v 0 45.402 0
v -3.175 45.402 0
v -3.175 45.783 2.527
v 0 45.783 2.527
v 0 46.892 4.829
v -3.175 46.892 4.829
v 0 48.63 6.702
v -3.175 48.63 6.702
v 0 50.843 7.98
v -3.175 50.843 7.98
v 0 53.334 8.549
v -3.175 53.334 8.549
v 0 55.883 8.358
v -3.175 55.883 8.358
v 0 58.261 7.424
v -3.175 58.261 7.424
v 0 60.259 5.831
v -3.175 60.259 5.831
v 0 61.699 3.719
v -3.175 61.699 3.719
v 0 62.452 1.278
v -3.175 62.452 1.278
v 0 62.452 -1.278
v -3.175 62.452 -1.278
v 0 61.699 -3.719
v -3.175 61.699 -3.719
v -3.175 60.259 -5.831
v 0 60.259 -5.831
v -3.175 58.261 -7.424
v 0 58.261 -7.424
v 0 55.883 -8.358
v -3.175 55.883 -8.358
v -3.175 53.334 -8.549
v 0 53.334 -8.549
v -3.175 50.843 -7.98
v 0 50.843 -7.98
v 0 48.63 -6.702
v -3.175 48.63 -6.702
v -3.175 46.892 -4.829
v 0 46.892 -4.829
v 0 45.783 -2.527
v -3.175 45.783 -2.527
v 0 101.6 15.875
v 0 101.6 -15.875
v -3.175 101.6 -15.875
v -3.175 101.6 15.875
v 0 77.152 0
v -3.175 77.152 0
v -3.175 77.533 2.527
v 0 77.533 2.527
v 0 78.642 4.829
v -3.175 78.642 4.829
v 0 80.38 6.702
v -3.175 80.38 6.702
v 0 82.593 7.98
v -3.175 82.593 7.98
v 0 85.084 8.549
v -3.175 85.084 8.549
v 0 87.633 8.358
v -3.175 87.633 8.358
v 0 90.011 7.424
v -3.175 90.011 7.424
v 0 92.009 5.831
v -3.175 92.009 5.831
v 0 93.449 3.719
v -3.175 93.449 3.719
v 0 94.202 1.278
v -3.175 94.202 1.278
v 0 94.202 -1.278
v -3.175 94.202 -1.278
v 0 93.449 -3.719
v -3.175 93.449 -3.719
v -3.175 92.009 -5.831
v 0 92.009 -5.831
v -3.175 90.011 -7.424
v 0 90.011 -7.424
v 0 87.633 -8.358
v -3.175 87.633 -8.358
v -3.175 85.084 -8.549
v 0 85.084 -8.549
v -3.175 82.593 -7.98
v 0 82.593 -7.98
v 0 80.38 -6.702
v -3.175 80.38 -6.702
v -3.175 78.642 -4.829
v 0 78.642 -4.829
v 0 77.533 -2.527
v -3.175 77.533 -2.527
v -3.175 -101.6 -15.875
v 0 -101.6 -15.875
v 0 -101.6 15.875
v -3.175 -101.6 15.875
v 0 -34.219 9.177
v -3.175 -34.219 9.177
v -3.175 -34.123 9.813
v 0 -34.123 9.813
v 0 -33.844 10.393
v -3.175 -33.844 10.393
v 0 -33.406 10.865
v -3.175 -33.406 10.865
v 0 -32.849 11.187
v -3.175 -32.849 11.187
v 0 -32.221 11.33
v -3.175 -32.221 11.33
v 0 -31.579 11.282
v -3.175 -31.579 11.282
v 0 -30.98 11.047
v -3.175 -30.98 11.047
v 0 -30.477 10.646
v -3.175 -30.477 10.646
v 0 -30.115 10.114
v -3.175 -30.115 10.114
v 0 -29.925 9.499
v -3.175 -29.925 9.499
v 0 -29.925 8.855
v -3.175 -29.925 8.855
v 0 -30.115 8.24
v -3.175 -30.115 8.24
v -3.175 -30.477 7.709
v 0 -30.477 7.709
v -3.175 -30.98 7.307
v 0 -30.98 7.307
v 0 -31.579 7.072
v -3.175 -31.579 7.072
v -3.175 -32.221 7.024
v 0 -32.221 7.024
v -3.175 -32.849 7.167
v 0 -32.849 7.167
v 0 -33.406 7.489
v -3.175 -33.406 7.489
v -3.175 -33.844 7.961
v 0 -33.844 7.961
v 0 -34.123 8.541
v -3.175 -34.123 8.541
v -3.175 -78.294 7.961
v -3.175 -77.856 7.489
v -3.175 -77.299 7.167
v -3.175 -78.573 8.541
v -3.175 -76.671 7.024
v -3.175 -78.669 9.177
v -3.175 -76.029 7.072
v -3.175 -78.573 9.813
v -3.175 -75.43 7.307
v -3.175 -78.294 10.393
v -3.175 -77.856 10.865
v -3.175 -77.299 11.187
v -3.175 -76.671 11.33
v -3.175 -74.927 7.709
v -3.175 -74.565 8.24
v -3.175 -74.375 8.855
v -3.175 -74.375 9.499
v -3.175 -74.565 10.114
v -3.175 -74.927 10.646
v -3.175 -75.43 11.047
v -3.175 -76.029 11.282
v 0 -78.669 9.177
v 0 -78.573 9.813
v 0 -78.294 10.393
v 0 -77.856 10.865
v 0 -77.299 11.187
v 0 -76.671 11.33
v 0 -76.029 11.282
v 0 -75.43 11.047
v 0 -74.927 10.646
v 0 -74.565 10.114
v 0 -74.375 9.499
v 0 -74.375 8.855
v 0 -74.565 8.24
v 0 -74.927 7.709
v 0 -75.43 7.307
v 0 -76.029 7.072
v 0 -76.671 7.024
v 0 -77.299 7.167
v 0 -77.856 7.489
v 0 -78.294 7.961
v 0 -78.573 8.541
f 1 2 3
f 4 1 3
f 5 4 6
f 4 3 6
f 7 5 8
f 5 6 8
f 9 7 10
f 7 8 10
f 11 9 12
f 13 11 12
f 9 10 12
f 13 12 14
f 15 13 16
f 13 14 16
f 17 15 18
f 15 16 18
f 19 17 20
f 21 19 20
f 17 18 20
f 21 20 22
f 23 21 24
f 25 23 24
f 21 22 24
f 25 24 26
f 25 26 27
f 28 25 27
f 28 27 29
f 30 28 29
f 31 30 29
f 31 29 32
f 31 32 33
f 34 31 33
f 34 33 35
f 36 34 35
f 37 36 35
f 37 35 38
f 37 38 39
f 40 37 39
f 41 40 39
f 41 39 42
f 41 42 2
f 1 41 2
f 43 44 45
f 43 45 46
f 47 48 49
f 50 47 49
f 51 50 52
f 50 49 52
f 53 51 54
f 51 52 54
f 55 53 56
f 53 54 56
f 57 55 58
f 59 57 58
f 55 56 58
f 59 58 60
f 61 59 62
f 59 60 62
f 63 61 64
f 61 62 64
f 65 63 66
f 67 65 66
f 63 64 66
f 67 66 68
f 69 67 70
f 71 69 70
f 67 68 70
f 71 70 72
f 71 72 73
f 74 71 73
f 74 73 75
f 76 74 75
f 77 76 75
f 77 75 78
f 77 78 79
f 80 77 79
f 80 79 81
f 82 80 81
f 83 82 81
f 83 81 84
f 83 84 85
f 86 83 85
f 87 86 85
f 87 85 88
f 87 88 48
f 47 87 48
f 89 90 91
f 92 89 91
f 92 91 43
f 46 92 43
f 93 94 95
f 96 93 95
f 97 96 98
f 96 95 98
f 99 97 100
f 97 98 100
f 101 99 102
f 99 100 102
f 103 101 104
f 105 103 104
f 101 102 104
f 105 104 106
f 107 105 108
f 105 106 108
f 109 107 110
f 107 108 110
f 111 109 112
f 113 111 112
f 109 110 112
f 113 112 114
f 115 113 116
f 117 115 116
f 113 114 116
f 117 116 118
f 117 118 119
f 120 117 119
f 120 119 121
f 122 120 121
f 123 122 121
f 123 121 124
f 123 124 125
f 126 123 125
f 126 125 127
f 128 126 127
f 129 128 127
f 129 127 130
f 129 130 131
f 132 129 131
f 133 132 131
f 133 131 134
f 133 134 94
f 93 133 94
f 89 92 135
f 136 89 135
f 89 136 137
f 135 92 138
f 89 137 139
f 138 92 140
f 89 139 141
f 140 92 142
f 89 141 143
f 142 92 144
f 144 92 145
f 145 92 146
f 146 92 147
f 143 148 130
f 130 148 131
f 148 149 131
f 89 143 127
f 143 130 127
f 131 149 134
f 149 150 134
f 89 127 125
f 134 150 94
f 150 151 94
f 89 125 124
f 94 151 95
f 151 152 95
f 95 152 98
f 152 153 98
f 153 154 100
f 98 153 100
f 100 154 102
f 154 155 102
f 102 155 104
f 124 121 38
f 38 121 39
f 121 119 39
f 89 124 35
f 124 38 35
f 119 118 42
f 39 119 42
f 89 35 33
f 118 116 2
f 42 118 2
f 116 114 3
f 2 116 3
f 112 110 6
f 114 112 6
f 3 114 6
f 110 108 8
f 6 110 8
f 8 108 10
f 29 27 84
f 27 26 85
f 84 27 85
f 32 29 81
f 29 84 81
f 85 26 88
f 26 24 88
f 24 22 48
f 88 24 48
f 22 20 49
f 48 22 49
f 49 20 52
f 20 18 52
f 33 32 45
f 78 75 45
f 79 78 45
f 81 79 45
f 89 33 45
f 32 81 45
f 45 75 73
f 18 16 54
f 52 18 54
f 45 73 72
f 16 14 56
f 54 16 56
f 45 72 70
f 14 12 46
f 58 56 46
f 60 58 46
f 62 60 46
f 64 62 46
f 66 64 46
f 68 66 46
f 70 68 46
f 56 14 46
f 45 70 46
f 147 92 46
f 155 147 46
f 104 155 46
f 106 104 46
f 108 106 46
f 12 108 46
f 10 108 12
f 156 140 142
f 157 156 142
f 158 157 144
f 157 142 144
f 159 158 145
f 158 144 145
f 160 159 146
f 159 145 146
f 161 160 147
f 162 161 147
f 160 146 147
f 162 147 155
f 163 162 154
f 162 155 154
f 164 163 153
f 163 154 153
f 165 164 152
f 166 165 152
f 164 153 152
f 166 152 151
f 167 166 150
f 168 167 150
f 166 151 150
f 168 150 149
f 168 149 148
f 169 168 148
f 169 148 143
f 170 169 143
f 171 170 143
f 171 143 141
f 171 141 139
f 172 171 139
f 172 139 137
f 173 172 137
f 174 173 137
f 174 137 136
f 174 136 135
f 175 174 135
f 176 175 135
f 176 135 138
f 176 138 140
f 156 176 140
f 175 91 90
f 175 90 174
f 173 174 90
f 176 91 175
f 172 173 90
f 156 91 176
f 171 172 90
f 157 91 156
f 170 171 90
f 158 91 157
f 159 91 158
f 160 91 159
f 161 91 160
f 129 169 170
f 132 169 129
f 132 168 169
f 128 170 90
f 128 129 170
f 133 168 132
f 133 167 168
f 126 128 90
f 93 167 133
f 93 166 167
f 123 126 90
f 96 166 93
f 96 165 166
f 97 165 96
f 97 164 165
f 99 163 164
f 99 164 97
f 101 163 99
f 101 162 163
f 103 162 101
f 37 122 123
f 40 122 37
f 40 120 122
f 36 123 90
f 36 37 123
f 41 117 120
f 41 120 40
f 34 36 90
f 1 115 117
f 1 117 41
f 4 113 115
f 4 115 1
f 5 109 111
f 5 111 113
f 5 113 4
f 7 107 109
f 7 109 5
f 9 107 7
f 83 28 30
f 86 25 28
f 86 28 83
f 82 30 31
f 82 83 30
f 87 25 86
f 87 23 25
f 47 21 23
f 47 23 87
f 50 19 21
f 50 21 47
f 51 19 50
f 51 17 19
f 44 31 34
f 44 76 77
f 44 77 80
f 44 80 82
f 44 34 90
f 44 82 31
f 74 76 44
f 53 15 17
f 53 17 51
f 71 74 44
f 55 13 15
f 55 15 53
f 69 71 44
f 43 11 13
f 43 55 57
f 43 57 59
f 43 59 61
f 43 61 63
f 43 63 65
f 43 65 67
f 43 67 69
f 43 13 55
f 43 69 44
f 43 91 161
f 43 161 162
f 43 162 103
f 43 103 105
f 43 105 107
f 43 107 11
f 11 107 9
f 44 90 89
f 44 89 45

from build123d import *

# Parameters (mm, degrees)
F0_W     = 203.2
F0_H     = 31.75
F1_DEPTH = 3.175
F3_D     = 17.145
F4_D     = 4.318


with BuildPart() as f1:
    # F0 (on Right) → F1 (new body)
    with BuildSketch(Plane.YZ):
        Rectangle(F0_W, F0_H)
    extrude(amount=-F1_DEPTH)

    # F3 (through all)
    with Locations(Plane.YZ):
        with Locations((85.725, 0), (53.975, 0)):
            Hole(F3_D / 2)

    # F4 (through all)
    with Locations(Plane.YZ):
        with Locations((-76.50988, 9.17702), (-32.05988, 9.17702)):
            Hole(F4_D / 2)


solid = f1.part
